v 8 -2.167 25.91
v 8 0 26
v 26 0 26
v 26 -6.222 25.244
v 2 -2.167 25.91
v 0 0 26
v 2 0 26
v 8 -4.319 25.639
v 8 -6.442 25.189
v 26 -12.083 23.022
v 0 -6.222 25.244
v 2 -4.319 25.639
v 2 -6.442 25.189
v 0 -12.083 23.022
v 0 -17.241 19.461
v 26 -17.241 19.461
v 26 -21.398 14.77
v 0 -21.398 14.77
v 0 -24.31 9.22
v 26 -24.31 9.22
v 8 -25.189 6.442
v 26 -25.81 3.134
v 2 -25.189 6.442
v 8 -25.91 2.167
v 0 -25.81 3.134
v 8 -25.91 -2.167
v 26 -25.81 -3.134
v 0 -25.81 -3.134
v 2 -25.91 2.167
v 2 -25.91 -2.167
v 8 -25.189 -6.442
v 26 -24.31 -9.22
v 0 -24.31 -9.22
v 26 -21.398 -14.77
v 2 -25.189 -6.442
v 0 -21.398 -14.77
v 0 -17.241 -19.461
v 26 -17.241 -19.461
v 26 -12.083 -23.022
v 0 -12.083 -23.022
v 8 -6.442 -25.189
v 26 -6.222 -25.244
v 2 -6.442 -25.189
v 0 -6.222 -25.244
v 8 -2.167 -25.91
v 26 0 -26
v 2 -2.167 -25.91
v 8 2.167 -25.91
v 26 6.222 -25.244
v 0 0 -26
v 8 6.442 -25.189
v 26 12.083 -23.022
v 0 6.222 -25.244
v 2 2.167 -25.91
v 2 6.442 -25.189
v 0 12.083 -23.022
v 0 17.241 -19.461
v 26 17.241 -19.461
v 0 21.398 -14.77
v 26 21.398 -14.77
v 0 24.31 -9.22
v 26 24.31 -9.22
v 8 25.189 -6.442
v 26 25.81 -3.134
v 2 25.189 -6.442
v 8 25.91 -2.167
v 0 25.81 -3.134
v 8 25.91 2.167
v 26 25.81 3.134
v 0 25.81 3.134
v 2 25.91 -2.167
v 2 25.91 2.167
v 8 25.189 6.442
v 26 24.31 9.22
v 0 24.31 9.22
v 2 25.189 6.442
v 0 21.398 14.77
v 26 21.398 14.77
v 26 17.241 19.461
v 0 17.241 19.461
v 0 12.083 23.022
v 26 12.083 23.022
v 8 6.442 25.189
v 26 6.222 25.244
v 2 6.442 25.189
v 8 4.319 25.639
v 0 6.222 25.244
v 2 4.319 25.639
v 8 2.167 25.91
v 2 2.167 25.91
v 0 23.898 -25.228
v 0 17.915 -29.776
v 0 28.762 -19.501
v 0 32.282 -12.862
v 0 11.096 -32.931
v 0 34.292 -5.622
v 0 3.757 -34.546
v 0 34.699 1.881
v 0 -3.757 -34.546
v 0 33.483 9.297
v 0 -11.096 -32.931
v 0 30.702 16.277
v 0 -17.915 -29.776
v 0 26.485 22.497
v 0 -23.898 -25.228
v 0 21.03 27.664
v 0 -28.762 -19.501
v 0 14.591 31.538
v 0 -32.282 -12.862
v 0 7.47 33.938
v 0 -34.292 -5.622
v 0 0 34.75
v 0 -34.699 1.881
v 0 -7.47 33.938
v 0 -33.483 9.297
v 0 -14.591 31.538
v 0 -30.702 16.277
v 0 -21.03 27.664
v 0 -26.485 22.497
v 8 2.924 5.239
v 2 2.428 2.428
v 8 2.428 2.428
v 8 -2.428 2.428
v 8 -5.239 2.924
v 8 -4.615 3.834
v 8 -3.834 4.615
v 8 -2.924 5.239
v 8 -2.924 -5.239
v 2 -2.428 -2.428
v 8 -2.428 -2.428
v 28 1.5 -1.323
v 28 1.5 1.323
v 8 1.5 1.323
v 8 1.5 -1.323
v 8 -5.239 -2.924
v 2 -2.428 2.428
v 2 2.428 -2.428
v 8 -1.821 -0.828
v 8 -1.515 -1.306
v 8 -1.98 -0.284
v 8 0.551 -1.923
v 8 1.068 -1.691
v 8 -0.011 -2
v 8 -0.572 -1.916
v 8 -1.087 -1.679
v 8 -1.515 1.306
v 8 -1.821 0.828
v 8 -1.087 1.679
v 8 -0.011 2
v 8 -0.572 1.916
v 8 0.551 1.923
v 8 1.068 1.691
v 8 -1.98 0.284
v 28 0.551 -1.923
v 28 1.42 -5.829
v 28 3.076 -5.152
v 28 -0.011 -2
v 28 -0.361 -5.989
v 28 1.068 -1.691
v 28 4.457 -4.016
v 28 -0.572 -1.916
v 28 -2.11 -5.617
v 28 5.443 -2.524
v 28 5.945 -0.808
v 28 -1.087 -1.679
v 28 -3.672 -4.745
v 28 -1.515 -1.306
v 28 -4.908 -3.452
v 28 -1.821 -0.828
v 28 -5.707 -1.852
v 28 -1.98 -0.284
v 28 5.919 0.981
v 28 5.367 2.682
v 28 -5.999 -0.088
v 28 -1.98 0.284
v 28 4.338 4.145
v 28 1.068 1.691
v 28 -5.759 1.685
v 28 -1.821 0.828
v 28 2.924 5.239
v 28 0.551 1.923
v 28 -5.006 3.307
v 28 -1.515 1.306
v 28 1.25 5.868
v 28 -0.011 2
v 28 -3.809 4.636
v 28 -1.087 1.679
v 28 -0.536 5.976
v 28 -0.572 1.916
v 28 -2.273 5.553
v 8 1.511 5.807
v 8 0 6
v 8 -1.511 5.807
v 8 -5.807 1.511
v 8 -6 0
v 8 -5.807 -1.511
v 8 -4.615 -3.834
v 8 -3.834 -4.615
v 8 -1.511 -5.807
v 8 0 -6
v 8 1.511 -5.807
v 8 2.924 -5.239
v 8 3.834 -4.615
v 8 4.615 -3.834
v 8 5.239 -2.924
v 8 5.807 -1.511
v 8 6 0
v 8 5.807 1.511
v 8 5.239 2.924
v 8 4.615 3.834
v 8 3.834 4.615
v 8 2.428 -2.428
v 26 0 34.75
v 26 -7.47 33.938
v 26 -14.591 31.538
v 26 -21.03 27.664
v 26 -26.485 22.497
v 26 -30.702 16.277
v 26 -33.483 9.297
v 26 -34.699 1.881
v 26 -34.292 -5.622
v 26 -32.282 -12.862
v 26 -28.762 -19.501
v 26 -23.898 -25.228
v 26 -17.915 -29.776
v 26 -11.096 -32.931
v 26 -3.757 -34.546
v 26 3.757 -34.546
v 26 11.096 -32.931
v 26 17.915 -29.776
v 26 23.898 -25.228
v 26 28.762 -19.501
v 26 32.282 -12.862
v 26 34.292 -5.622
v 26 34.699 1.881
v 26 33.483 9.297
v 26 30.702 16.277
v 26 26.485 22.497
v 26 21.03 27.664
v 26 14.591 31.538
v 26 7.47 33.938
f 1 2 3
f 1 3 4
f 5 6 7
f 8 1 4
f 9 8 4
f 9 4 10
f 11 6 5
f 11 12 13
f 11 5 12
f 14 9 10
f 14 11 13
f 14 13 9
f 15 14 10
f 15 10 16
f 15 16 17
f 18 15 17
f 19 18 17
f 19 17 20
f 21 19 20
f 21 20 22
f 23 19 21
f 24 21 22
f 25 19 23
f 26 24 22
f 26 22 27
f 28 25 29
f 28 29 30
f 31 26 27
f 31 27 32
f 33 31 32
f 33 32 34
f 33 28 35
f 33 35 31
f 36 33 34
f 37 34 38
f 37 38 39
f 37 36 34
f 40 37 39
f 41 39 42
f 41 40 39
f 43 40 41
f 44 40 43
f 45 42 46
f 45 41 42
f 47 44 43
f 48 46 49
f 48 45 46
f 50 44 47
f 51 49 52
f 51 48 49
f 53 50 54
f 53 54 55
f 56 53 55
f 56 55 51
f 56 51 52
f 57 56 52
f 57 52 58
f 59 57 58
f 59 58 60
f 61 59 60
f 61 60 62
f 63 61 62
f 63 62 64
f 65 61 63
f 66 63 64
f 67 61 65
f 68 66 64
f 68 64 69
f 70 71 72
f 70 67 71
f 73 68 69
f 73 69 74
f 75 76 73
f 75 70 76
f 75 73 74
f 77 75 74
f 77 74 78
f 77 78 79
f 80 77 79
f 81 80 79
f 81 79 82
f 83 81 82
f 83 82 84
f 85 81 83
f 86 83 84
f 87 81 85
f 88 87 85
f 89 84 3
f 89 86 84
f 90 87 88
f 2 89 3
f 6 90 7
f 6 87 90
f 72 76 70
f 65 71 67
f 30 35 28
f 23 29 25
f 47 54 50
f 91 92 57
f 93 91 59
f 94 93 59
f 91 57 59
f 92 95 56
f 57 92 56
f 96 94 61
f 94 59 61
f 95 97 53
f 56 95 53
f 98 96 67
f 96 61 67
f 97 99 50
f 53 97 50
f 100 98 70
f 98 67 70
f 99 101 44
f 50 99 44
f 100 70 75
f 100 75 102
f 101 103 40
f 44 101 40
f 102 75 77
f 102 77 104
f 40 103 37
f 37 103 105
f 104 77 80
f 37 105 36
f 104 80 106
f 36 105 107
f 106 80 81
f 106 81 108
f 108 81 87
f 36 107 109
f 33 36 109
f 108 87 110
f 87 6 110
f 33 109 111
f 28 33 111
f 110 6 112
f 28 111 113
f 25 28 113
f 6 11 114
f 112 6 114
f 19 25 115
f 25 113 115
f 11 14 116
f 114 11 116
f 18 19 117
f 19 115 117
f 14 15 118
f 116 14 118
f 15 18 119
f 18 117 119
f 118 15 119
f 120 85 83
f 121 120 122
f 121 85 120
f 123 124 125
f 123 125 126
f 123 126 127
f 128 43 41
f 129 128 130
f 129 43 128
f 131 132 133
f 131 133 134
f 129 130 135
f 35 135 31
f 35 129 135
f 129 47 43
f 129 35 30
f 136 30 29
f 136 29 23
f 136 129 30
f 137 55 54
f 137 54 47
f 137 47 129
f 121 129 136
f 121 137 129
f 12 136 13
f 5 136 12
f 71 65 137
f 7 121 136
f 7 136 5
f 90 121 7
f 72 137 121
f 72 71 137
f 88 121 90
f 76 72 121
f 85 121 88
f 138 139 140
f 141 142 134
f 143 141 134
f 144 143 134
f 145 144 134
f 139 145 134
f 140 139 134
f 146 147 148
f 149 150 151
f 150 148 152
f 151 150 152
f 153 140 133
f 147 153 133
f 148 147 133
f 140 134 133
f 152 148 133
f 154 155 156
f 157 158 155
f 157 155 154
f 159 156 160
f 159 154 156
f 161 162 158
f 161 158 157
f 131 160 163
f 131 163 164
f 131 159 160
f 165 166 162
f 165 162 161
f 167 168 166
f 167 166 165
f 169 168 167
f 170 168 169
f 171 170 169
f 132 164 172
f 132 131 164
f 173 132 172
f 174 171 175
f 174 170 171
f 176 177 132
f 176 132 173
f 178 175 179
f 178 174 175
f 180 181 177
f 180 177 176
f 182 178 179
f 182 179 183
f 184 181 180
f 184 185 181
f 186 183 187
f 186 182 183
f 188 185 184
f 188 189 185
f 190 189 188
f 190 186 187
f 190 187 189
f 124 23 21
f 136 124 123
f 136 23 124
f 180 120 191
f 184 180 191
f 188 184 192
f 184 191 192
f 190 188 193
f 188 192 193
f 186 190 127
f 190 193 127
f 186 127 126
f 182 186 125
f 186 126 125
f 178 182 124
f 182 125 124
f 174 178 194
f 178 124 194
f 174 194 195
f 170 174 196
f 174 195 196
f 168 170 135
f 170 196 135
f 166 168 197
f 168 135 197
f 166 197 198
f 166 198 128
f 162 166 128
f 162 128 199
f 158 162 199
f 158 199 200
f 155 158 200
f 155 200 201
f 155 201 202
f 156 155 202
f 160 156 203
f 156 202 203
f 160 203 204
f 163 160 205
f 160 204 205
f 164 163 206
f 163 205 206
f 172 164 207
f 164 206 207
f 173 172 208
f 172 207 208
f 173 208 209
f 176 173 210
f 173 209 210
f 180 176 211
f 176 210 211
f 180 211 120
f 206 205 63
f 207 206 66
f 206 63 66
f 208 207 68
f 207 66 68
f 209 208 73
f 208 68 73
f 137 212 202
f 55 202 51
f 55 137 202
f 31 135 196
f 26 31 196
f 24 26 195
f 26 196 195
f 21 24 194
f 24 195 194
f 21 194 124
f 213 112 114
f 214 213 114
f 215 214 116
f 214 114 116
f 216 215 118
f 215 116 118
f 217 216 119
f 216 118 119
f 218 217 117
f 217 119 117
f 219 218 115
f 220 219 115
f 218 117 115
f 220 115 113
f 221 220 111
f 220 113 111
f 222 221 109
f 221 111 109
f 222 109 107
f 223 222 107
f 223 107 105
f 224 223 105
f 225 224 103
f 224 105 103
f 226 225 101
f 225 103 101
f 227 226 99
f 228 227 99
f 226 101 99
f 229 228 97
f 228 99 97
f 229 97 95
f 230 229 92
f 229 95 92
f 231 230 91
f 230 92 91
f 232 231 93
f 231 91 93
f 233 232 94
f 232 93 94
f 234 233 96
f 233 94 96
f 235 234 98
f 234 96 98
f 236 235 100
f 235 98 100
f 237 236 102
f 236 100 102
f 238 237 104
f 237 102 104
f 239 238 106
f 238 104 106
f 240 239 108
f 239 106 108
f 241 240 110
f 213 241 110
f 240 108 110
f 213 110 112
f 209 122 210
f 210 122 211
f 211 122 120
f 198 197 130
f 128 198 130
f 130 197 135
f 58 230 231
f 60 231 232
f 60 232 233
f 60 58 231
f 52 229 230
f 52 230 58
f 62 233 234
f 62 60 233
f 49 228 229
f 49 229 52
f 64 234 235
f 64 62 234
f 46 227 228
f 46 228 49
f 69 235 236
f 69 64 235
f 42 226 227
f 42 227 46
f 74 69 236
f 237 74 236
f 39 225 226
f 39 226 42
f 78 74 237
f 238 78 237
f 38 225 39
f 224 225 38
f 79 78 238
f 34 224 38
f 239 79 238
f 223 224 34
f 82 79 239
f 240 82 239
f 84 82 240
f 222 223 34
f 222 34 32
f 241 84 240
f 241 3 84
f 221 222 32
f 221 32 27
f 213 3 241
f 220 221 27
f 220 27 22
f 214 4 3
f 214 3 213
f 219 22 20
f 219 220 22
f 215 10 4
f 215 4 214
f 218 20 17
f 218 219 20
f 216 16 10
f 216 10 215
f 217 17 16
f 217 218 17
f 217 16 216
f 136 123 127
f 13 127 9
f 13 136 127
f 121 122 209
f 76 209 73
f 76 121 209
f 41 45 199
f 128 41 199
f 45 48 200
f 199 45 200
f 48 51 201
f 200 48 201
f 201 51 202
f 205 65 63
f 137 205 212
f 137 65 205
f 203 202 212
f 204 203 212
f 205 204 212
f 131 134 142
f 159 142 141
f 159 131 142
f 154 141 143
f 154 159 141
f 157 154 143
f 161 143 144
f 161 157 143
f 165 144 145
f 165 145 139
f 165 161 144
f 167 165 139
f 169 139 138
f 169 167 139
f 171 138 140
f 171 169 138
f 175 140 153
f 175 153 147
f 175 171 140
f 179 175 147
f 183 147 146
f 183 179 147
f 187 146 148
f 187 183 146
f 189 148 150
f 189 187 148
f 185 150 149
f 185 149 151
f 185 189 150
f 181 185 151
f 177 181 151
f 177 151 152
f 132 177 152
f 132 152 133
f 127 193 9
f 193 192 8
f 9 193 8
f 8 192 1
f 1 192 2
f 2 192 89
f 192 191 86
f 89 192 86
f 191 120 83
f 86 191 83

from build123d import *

# Parameters (mm, degrees)
SKETCH_1_R           = 34.75
SKETCH_1_R_2         = 26
EXTRUDE_1_DEPTH      = 26
EXTRUDE_2_DEPTH      = 3
EXTRUDE_2_DEPTH_BACK = 3
SKETCH_3_R           = 6
EXTRUDE_3_DEPTH      = 20
CUT_EXTRUDE_1_DEPTH  = 20


with BuildPart() as part:
    # 草图1 → 凸台-拉伸1 (new body)
    with BuildSketch(Plane(origin=(0, 0, 0), x_dir=(0, 0, -1), z_dir=(1, 0, 0))):
        with Locations(Location((0, 0, 0), (0, 0, 180))):
            Circle(SKETCH_1_R)
        with Locations(Location((0, 0, 0), (0, 0, 180))):
            Circle(SKETCH_1_R_2, mode=Mode.SUBTRACT)
    extrude(amount=EXTRUDE_1_DEPTH)

    # 草图2 → 凸台-拉伸2 (add, two sides: drawn at the far end of the back side and taken through both)
    with BuildSketch(Plane(origin=(5, 0, 0), x_dir=(0, 0, -1), z_dir=(1, 0, 0)).offset(-EXTRUDE_2_DEPTH_BACK)):
        with BuildLine():
            Line((-2.428148007, 2.428148007), (-6.441571828, 25.189405558))
            ThreePointArc((-6.441571828, 25.189405558), (0, 26), (6.441571828, 25.189405558))
            Line((6.441571828, 25.189405558), (2.428148007, 2.428148007))
            Line((2.428148007, 2.428148007), (25.189405558, 6.441571828))
            ThreePointArc((25.189405558, 6.441571828), (26, 0), (25.189405558, -6.441571828))
            Line((25.189405558, -6.441571828), (2.428148007, -2.428148007))
            Line((2.428148007, -2.428148007), (6.441571828, -25.189405558))
            ThreePointArc((6.441571828, -25.189405558), (0, -26), (-6.441571828, -25.189405558))
            Line((-6.441571828, -25.189405558), (-2.428148007, -2.428148007))
            Line((-2.428148007, -2.428148007), (-25.189405558, -6.441571828))
            ThreePointArc((-25.189405558, -6.441571828), (-26, 0), (-25.189405558, 6.441571828))
            Line((-25.189405558, 6.441571828), (-2.428148007, 2.428148007))
        make_face()
    extrude(amount=EXTRUDE_2_DEPTH + EXTRUDE_2_DEPTH_BACK)

    # 草图3 → 凸台-拉伸3 (add)
    with BuildSketch(Plane(origin=(8, 0, 0), x_dir=(0, 0, -1), z_dir=(1, 0, 0))):
        with Locations(Location((0, 0, 0), (0, 0, 150.836240305))):
            Circle(SKETCH_3_R)
    extrude(amount=EXTRUDE_3_DEPTH)

    # 草图4 → 切除-拉伸1 (cut)
    with BuildSketch(Plane(origin=(28, 0, 0), x_dir=(0, 0, -1), z_dir=(1, 0, 0))):
        with BuildLine():
            Line((-1.322875656, 1.5), (1.322875656, 1.5))
            ThreePointArc((1.322875656, 1.5), (0, -2), (-1.322875656, 1.5))
        make_face()
    extrude(amount=-CUT_EXTRUDE_1_DEPTH, mode=Mode.SUBTRACT)


solid = part.part
